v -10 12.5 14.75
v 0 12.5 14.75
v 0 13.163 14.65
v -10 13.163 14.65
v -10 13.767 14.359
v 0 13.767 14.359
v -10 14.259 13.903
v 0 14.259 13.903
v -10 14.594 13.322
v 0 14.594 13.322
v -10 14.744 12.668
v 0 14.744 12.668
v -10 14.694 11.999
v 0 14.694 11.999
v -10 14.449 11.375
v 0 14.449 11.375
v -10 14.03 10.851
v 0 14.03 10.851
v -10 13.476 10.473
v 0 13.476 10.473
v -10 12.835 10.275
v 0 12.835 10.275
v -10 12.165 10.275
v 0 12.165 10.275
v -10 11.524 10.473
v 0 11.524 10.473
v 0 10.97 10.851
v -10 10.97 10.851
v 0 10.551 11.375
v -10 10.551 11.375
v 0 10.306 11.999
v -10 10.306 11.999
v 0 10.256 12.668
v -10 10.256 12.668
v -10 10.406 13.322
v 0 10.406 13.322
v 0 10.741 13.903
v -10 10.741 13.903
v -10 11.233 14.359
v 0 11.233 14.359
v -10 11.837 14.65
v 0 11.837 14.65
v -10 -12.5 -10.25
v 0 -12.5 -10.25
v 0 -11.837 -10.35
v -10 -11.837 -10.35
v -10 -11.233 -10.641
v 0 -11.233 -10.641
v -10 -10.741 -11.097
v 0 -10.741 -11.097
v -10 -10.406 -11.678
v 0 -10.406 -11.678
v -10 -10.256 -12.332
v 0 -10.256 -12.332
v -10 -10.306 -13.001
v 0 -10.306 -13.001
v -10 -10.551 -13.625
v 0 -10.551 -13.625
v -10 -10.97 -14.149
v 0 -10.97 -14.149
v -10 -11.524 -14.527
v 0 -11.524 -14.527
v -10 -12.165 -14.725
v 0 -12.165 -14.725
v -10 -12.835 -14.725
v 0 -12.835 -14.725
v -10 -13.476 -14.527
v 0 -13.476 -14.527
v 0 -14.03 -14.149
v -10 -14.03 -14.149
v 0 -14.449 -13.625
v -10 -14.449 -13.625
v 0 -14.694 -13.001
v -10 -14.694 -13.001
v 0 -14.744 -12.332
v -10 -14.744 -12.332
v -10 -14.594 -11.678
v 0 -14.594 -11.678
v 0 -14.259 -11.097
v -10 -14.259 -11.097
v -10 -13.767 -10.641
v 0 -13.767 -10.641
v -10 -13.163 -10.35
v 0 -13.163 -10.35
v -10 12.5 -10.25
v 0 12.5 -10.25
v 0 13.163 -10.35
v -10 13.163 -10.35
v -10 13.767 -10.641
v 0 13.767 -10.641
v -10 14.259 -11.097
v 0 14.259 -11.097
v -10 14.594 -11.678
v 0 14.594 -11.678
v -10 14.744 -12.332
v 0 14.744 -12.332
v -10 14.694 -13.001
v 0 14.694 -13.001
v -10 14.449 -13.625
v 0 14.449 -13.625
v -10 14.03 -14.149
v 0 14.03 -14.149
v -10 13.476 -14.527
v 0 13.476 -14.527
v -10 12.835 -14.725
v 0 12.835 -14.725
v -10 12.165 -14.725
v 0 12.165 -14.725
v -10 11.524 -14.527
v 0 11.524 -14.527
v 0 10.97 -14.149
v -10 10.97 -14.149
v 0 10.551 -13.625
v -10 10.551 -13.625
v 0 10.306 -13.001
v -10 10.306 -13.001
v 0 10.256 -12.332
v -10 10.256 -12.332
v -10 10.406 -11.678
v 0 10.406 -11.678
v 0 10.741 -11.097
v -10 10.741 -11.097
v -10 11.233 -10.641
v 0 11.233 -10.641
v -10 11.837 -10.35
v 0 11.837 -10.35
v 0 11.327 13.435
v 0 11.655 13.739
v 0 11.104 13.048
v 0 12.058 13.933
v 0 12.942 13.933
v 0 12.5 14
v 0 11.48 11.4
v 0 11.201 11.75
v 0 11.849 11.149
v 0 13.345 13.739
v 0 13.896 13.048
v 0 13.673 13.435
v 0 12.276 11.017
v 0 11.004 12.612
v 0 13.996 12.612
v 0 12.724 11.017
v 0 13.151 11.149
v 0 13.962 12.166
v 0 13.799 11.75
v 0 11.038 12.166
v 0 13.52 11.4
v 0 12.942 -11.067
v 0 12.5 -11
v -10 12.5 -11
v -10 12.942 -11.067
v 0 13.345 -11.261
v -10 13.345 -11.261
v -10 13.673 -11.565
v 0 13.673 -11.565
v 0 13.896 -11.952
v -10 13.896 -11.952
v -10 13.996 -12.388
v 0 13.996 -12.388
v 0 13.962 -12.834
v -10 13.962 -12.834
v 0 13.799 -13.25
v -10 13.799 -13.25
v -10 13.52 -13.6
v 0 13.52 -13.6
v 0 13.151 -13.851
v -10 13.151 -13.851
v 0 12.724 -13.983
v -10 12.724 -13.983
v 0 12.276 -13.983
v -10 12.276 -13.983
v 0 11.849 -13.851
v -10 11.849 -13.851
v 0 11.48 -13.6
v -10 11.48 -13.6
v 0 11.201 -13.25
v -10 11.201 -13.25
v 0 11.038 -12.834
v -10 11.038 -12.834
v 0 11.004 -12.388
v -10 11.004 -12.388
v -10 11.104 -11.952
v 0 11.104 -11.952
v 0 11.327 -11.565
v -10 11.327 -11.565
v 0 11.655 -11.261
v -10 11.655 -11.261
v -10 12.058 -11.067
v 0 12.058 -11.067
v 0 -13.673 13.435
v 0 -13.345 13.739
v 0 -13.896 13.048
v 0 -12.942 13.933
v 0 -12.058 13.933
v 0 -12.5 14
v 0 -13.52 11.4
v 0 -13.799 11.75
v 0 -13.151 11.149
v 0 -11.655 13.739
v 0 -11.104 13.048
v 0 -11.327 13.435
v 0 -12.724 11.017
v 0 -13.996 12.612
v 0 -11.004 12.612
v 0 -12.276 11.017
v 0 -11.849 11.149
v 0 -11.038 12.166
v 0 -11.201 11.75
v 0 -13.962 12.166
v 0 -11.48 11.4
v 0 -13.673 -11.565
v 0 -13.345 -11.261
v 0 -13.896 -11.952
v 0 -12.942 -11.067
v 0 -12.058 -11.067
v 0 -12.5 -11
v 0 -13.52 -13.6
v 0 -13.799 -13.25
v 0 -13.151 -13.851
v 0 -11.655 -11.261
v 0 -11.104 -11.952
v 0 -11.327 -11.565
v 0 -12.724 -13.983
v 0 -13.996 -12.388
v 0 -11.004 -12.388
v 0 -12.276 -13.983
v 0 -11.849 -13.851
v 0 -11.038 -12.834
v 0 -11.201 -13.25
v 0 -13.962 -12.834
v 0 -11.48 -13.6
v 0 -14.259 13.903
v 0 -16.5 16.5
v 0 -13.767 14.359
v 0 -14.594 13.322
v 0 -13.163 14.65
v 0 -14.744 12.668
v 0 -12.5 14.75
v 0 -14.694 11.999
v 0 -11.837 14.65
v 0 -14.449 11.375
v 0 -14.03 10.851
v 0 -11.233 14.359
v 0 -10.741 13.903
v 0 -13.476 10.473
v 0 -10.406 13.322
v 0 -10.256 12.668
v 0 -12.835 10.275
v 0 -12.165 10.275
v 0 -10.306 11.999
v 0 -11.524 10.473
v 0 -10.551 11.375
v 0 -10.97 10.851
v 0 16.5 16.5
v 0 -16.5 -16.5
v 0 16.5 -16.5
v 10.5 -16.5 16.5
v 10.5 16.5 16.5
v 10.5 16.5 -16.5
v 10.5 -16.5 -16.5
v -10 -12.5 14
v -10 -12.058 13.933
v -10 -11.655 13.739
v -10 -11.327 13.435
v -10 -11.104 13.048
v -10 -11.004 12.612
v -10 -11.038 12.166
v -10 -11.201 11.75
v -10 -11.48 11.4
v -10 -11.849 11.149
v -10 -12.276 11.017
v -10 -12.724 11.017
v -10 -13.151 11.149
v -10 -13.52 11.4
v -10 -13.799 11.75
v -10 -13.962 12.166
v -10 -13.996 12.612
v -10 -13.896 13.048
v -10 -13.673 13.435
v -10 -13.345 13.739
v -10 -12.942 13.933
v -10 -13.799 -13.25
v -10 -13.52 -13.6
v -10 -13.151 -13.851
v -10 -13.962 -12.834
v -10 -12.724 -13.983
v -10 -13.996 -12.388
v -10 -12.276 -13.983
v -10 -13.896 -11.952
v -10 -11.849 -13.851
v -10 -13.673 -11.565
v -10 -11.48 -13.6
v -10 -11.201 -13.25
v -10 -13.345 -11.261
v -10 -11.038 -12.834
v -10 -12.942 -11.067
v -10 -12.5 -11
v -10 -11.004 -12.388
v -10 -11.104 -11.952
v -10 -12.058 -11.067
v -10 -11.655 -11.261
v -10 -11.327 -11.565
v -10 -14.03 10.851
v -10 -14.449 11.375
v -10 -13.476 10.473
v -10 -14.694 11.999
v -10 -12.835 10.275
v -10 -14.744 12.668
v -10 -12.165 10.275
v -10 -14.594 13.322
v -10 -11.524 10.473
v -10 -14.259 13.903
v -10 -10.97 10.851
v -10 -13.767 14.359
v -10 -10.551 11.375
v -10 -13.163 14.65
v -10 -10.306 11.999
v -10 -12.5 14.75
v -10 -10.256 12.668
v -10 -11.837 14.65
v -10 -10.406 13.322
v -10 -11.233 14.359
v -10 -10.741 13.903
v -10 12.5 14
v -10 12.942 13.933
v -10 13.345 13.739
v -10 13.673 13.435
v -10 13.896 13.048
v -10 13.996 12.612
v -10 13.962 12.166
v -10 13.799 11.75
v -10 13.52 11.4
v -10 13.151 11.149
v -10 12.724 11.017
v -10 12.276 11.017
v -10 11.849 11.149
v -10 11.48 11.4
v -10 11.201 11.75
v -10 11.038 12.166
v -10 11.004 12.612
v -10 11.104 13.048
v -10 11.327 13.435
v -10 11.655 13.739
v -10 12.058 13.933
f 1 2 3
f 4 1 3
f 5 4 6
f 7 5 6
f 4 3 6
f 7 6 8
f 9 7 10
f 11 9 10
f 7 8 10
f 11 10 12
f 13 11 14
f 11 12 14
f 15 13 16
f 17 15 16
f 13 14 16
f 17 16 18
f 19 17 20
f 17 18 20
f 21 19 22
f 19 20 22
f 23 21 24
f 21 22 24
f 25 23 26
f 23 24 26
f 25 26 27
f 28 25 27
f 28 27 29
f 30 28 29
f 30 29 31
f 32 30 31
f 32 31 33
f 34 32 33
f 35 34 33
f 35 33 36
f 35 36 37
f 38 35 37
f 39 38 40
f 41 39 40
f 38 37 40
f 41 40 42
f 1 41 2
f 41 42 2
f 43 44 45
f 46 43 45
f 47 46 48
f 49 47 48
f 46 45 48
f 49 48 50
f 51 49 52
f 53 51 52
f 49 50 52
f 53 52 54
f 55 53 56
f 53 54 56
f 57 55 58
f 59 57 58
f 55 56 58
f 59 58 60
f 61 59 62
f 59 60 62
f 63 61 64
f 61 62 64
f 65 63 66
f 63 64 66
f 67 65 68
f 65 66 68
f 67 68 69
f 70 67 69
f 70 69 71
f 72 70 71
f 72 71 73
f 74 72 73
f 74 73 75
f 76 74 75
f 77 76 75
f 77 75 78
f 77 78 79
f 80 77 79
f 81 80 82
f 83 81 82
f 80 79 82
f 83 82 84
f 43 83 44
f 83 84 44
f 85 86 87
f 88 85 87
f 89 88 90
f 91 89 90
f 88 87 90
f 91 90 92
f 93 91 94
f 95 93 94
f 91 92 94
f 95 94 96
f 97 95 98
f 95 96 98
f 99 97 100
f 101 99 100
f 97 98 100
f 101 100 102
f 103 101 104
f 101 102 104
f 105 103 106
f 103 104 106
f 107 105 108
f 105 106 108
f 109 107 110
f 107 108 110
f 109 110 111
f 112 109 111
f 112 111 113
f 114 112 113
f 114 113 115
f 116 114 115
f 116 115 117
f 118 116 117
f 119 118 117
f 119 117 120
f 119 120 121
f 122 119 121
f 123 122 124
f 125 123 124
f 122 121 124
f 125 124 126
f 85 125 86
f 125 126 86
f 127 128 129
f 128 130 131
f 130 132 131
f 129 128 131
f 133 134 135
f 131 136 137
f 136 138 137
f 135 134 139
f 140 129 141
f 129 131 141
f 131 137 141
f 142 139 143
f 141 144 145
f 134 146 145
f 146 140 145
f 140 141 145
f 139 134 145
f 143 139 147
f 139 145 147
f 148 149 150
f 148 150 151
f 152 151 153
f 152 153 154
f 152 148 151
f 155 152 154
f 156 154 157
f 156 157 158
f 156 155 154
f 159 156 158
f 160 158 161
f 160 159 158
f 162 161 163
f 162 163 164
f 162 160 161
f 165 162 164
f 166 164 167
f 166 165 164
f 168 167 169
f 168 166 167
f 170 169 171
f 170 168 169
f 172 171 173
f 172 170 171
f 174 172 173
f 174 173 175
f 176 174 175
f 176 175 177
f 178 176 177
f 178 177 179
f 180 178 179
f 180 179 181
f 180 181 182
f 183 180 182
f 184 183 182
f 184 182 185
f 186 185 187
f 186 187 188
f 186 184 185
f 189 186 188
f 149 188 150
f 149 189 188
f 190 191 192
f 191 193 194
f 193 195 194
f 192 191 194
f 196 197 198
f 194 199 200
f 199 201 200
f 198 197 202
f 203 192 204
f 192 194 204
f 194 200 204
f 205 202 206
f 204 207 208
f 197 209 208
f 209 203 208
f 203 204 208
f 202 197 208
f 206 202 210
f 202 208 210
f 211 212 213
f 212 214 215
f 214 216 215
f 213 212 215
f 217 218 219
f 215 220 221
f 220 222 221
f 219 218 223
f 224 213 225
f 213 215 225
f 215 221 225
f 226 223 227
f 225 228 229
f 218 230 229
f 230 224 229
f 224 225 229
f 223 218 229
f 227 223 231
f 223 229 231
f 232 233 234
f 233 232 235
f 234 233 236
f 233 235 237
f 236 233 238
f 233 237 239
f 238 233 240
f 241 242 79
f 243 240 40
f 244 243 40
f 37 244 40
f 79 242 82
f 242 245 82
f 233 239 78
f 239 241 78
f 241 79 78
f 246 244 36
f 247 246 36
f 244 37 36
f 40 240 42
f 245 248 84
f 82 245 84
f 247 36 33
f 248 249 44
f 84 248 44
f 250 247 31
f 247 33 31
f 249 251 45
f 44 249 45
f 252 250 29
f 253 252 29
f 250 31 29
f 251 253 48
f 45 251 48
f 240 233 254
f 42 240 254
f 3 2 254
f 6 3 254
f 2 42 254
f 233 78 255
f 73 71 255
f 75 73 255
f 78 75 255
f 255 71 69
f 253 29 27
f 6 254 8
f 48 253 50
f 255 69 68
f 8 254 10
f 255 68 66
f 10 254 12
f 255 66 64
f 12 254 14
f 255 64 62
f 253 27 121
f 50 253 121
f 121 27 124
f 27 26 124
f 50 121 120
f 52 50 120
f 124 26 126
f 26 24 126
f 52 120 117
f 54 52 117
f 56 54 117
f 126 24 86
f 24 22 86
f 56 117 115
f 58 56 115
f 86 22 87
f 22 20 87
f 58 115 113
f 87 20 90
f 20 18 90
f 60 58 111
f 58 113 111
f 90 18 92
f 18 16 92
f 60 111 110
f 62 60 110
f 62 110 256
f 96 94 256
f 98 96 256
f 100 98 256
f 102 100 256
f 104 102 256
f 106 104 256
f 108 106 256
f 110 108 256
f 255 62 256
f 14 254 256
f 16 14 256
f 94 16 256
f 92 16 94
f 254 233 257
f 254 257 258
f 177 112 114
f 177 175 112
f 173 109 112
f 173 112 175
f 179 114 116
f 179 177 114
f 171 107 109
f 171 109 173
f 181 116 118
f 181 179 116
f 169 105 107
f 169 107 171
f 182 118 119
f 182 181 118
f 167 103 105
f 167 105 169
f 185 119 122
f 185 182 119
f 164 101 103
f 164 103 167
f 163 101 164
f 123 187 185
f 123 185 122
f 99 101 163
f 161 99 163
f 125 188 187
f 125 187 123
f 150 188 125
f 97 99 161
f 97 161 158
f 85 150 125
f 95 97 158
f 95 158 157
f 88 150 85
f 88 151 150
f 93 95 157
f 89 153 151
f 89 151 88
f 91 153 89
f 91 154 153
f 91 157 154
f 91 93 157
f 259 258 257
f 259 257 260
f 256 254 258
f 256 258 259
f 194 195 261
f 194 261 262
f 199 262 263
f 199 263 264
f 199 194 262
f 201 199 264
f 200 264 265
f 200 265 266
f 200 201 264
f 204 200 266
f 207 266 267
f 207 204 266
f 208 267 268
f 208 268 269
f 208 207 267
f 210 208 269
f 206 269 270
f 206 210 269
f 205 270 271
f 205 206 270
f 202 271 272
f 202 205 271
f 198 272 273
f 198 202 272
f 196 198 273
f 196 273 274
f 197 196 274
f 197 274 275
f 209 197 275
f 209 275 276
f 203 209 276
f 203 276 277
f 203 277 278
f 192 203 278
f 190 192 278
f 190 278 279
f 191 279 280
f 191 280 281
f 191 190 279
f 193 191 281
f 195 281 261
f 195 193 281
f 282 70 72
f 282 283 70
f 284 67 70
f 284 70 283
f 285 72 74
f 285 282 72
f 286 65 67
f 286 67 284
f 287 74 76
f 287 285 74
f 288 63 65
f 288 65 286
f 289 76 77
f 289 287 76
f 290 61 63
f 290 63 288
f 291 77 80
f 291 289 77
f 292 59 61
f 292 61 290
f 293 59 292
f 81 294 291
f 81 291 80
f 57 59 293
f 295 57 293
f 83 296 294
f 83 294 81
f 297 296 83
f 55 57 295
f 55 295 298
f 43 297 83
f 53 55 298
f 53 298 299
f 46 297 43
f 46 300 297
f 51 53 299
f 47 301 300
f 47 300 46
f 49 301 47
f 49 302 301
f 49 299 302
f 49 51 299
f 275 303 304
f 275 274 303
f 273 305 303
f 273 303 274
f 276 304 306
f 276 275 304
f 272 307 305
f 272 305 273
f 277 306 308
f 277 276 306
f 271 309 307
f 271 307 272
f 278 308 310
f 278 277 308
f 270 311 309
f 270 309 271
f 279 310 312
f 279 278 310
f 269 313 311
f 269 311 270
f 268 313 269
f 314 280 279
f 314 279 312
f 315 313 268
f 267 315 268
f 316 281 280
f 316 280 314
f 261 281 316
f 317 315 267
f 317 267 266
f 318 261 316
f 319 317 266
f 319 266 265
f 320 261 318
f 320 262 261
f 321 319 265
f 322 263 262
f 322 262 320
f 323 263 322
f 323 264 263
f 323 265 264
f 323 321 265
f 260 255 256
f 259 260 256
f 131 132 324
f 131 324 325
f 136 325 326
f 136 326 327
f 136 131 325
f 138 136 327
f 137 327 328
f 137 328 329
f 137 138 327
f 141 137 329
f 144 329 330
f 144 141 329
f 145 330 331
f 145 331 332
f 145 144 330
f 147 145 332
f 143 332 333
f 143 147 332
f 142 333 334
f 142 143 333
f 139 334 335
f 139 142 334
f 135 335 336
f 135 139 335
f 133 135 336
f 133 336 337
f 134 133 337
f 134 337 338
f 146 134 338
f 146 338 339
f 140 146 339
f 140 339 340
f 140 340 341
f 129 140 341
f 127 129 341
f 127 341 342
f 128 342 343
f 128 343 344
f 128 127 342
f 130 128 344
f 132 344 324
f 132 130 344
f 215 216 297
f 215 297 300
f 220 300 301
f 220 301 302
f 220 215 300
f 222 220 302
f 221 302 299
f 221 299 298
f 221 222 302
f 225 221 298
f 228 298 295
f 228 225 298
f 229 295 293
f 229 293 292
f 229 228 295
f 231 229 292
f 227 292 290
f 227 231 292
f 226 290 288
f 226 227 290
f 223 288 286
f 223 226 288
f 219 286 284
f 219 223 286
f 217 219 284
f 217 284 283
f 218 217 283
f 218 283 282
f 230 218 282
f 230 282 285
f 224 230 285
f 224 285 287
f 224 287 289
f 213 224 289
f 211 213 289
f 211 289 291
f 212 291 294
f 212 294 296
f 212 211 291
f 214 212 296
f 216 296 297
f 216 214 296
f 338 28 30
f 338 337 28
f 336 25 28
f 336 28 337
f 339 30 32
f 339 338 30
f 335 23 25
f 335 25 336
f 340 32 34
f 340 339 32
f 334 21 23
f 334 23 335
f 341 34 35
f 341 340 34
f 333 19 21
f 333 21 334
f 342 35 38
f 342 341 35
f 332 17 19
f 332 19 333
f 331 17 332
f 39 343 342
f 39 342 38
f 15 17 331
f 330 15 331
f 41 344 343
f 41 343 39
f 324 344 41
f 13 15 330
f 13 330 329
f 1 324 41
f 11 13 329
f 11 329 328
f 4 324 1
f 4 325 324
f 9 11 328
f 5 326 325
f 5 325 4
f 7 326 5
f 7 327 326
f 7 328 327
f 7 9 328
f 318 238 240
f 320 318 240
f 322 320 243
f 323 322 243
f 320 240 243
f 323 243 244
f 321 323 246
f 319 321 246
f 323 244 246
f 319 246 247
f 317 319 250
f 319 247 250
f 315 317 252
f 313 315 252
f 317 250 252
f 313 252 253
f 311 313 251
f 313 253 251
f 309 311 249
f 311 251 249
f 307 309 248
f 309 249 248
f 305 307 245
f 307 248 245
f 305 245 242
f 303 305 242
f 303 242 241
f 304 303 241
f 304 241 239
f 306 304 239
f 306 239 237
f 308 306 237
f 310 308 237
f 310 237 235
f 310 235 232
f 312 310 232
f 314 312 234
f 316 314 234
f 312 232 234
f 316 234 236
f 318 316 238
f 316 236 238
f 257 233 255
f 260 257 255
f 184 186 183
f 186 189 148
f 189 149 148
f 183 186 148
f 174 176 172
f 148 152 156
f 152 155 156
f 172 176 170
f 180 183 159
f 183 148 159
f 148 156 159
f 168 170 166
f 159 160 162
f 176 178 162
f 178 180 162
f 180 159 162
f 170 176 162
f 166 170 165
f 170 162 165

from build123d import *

# Parameters (mm, degrees)
SKETCH1_W           = 33
SKETCH1_H           = 33
BOSS_EXTRUDE1_DEPTH = 10.5
SKETCH2_R           = 2.25
SKETCH2_R_2         = 1.5
BOSS_EXTRUDE2_DEPTH = 10


with BuildPart() as part:
    # Sketch1 → Boss-Extrude1 (new body)
    with BuildSketch(Plane(origin=(0, 0, 0), x_dir=(0, 0, -1), z_dir=(1, 0, 0))):
        Rectangle(SKETCH1_W, SKETCH1_H)
    extrude(amount=BOSS_EXTRUDE1_DEPTH)

    # Sketch2 → Boss-Extrude2 (add)
    # profile 1 of 4: a face of its own
    with BuildSketch(Plane.ZY):
        with Locations((-12.5, 12.5)):
            Circle(SKETCH2_R)
        with Locations((-12.5, 12.5)):
            Circle(SKETCH2_R_2, mode=Mode.SUBTRACT)
    # profile 2 of 4: a face of its own
    with BuildSketch(Plane.ZY):
        with Locations((-12.5, -12.5)):
            Circle(SKETCH2_R)
        with Locations((-12.5, -12.5)):
            Circle(SKETCH2_R_2, mode=Mode.SUBTRACT)
    # profile 3 of 4: a face of its own
    with BuildSketch(Plane.ZY):
        with Locations((12.5, -12.5)):
            Circle(SKETCH2_R)
        with Locations((12.5, -12.5)):
            Circle(SKETCH2_R_2, mode=Mode.SUBTRACT)
    # profile 4 of 4: a face of its own
    with BuildSketch(Plane.ZY):
        with Locations((12.5, 12.5)):
            Circle(SKETCH2_R)
        with Locations((12.5, 12.5)):
            Circle(SKETCH2_R_2, mode=Mode.SUBTRACT)
    extrude(amount=BOSS_EXTRUDE2_DEPTH)


solid = part.part
